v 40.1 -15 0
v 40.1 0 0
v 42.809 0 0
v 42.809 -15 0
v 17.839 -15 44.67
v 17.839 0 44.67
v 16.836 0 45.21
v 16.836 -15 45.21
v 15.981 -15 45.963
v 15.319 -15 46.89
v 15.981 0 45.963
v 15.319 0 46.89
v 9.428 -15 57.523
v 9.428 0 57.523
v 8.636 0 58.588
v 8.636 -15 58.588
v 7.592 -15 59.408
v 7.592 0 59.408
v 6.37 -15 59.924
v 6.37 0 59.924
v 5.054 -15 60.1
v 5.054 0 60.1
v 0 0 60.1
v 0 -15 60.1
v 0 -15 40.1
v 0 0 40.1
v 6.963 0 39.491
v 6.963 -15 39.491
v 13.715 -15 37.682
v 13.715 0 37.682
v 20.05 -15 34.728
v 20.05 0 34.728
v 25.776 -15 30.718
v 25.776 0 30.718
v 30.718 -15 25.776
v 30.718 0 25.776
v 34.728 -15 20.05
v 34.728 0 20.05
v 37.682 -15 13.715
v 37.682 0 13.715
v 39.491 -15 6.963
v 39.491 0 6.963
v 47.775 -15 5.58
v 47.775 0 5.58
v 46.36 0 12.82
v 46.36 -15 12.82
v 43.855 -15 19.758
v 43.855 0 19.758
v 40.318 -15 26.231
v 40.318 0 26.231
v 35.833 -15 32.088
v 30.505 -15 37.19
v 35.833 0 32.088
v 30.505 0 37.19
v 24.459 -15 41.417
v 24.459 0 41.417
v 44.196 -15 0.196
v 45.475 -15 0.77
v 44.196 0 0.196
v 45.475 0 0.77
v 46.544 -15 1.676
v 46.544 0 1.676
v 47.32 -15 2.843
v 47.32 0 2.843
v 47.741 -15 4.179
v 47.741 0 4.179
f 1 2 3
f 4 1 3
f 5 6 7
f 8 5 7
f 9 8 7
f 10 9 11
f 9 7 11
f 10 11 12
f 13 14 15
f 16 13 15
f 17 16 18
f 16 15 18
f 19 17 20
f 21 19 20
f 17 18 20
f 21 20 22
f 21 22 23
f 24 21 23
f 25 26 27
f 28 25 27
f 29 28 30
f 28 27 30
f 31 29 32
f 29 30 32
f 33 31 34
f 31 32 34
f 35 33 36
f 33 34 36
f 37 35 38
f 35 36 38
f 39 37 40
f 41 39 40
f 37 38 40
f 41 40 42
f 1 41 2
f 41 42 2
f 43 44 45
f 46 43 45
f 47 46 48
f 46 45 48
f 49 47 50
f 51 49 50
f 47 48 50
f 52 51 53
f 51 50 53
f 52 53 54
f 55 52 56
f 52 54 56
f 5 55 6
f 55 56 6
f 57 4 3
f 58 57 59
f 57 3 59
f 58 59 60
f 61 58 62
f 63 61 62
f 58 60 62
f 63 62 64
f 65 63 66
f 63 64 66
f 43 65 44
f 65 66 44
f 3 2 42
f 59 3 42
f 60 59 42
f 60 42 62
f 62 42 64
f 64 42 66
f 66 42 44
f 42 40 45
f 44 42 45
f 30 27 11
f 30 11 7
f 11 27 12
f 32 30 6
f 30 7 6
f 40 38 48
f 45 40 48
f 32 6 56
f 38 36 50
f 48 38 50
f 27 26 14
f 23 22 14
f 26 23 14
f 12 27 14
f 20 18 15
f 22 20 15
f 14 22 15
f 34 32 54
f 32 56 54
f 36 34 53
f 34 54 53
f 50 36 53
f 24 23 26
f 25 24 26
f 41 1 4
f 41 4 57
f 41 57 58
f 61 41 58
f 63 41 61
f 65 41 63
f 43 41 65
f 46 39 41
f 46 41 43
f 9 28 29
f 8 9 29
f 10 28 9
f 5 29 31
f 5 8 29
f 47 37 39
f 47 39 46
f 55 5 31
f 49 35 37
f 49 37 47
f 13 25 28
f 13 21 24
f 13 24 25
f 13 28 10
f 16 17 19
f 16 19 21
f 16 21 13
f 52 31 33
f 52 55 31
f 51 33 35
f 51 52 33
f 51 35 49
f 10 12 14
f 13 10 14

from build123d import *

# Parameters (mm, degrees)
F1_DEPTH = 15


with BuildPart() as f1:
    # F0 (on Front) → F1 (new body)
    with BuildSketch(Plane.XZ):
        with BuildLine():
            ThreePointArc((0, 40.1), (28.354982, 28.354982), (40.1, 0))
            Line((40.1, 0), (42.808995, 0))
            ThreePointArc((42.808995, 0), (46.54398, 1.675863), (47.775236, 5.580046))
            ThreePointArc((47.775236, 5.580046), (38.187671, 29.245715), (17.838656, 44.669815))
            ThreePointArc((17.838656, 44.669815), (16.387117, 45.562084), (15.31947, 46.889954))
            Line((15.31947, 46.889954), (9.427711, 57.523294))
            ThreePointArc((9.427711, 57.523294), (7.592257, 59.407927), (5.054194, 60.1))
            Line((5.054194, 60.1), (0, 60.1))
            Line((0, 60.1), (0, 40.1))
        make_face()
    extrude(amount=F1_DEPTH)


solid = f1.part
